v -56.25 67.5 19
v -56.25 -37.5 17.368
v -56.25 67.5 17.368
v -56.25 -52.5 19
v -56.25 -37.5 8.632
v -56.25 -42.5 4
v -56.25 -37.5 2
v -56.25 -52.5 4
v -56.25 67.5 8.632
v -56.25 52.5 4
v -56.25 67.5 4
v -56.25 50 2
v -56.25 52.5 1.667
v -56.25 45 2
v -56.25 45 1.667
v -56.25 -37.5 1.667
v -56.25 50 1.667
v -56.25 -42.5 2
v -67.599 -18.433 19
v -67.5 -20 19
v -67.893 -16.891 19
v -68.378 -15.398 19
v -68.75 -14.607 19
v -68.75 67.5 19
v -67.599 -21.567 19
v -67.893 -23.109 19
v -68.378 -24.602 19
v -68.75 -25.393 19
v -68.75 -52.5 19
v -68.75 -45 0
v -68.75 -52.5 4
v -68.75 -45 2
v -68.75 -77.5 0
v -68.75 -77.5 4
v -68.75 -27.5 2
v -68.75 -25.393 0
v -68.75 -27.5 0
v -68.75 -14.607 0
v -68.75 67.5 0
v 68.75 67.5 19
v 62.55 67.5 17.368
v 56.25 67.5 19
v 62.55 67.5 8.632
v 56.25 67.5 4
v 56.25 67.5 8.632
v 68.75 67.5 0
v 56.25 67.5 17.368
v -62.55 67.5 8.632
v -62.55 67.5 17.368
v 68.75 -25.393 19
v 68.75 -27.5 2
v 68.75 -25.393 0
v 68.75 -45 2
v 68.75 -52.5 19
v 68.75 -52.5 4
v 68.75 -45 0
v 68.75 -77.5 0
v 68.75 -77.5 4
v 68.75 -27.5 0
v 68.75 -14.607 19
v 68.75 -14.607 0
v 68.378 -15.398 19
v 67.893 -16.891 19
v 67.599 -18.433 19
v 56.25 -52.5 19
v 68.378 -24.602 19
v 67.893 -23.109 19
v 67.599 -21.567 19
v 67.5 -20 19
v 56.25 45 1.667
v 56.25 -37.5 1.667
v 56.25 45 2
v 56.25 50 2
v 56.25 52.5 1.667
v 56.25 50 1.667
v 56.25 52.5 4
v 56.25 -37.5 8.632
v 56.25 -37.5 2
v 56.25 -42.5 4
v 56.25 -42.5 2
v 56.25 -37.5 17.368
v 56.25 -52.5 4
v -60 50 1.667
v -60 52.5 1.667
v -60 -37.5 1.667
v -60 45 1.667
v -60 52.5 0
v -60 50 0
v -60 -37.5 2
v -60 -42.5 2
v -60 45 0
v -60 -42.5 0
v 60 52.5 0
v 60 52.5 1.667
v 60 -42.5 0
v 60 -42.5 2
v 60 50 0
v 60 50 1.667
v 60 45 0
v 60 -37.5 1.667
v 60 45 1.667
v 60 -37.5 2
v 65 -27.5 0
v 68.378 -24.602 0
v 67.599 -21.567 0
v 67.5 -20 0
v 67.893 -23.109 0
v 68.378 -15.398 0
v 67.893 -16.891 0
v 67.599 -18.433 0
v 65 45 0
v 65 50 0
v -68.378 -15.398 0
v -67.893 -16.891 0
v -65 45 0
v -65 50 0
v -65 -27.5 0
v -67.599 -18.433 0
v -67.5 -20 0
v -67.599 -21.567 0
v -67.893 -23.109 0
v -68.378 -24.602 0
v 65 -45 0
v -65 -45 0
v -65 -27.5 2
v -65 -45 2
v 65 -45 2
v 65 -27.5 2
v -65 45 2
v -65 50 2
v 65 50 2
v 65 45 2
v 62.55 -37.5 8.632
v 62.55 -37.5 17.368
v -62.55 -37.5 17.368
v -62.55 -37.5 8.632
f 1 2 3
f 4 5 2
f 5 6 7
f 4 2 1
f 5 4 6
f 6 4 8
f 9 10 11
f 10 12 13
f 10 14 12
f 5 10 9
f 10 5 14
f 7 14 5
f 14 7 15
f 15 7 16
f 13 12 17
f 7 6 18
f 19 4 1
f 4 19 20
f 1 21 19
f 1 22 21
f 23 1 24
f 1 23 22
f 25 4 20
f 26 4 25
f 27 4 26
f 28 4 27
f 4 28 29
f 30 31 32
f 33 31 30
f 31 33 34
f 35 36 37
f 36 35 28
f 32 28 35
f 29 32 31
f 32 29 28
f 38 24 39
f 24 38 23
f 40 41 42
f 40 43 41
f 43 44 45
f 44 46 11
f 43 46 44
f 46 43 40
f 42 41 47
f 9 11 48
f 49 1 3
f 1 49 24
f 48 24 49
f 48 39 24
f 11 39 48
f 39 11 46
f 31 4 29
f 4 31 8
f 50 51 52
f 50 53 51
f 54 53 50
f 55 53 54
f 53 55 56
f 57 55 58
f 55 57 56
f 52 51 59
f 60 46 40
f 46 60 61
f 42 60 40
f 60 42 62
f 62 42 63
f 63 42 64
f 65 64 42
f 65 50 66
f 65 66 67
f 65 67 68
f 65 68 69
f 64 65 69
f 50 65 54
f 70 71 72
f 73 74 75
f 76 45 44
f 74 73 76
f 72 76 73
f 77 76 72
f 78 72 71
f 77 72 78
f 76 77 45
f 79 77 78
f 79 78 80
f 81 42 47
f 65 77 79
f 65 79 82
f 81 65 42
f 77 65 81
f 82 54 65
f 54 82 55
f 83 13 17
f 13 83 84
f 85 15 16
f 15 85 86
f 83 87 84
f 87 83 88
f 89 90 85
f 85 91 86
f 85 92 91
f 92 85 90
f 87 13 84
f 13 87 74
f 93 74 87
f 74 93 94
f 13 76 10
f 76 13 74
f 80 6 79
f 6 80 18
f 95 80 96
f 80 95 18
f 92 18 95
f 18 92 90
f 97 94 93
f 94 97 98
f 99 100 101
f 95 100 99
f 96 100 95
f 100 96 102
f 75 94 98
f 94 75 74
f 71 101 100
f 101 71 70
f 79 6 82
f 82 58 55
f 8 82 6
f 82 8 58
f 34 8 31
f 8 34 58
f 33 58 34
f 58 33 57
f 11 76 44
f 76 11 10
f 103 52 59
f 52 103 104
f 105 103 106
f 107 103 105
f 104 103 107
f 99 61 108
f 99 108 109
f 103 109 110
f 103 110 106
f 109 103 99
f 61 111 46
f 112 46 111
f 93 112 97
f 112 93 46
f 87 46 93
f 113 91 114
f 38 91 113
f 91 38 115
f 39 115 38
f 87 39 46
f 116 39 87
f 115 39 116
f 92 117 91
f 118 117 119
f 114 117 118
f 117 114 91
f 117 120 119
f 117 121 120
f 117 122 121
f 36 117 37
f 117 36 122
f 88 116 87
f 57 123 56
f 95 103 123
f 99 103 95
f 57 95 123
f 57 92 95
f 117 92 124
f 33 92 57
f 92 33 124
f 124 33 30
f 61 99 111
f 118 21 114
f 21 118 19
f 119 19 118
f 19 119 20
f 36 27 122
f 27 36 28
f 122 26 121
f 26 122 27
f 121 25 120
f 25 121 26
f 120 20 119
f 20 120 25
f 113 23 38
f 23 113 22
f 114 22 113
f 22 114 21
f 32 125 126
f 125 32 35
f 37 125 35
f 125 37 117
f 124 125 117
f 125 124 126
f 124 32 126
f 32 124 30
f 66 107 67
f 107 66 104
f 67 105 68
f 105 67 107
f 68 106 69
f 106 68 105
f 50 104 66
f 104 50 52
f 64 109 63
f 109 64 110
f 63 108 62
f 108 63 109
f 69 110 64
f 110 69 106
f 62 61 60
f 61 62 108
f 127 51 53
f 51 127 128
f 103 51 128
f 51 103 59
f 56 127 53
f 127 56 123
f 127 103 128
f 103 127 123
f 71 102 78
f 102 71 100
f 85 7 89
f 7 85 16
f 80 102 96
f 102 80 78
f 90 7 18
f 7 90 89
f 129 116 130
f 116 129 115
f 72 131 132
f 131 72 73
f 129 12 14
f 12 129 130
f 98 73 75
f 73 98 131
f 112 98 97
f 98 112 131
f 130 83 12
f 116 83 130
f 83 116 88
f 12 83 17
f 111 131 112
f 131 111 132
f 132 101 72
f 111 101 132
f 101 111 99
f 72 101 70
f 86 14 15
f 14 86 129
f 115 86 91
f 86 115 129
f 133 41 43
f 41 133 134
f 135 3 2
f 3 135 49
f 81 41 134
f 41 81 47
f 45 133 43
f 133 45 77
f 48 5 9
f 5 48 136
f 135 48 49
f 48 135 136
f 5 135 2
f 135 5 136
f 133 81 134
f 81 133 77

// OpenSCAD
// file: tablet.scad
module tablet(){
    module tablet_cm(){
        total_dims = [12.51, 21, 0.8736];
        screen_dims = [11, 17.5];
        color("LightBlue")cube(total_dims, center=true);
        color("Blue")translate([0,0, total_dims[2]/2])linear_extrude(height=0.01)square(screen_dims, center=true);   
    }
    scale([10,10,10])tablet_cm();
}
tablet();
// file: dash.scad
module dash(){
    module dash_cm(){
        total_area_dims = [23, 14.5];
        
        // total dash
        color("LightBlue")translate([0,0,-1])linear_extrude(height=1)square(total_area_dims, center=true);
        
        // screen
        screen_dims = [12, 7.5];
        screen_center = [0.5, 0.5, 0];
        color("Blue")translate(screen_center)linear_extrude(height=.01)square(screen_dims, center=true);
        
        // buttons
        button_height = 0.2;
        
        radio_button_dims = [screen_dims[0], 0.5];
        radio_button_center = screen_center + [0, -((screen_dims[1]/2)+radio_button_dims[1]/2)];
        color("DodgerBlue")translate(radio_button_center)linear_extrude(height=button_height)square(radio_button_dims, center=true);
        
        // cd player
        cd_player_dims = [13, 0.5];
        cd_player_center = screen_center + [0, screen_dims[1]/2 + 1];
        color("DodgerBlue")translate(cd_player_center)linear_extrude(height=button_height)square(cd_player_dims, center=true);
        
        module side_buttons() {
            color("DeepSkyBlue")translate([0,1,0])linear_extrude(height=button_height)square([2,1], center=true);
            color("DeepSkyBlue")translate([0,-1.75/2,0])linear_extrude(height=button_height)square([2,1.75], center=true);
            color("blue")translate([0,-1.75 * 3/2,0])linear_extrude(height=button_height)square([2,1.75], center=true);
            
            color("CornflowerBlue")translate([0,-5.75,0])linear_extrude(height=2)circle(1.25, $fn=50);
            color("DeepSkyBlue")translate([1.5/2,-5.75 - 2.5 + (1.75/2),0])linear_extrude(height=button_height)square([1.5,1.75], center=true);
            color("blue")translate([-1.5/2,-5.75 - 2.5 + (1.75/2),0])linear_extrude(height=button_height)square([1.5,1.75], center=true);
        }
        for(i=[-1,1]) translate(screen_center + [i*(screen_dims[0]/2+2), screen_dims[1]/2, 0])side_buttons();
    }
    scale([10,10,10])dash_cm();
}
dash();
// main file
use <dash.scad>
use <tablet.scad>

module mount(){
    module _mount(){
        arm_depth = 20;
        module arm() {
            for(i=[-1,1]) translate([i*62.5,07.5,arm_depth/2])cube([12.5, 120, arm_depth], center=true);
        }
        difference(){
            arm();
            for(i=[-1,1]) translate([i*57.5,05,arm_depth/60-01])cube([5, 95, arm_depth/3], center=true);
        }
        
        plate_depth = 05;
        translate([0,-60,plate_depth/2])cube([137.5, 35, plate_depth], center=true);
        translate([0,60,plate_depth/2])cube([137.5, 15, plate_depth], center=true);
    }
    difference() {
        translate([0,0,-01])_mount();
        translate([-05,-05,0])dash();
        translate([0,67.5,13])tablet();
    }
}
mount();
